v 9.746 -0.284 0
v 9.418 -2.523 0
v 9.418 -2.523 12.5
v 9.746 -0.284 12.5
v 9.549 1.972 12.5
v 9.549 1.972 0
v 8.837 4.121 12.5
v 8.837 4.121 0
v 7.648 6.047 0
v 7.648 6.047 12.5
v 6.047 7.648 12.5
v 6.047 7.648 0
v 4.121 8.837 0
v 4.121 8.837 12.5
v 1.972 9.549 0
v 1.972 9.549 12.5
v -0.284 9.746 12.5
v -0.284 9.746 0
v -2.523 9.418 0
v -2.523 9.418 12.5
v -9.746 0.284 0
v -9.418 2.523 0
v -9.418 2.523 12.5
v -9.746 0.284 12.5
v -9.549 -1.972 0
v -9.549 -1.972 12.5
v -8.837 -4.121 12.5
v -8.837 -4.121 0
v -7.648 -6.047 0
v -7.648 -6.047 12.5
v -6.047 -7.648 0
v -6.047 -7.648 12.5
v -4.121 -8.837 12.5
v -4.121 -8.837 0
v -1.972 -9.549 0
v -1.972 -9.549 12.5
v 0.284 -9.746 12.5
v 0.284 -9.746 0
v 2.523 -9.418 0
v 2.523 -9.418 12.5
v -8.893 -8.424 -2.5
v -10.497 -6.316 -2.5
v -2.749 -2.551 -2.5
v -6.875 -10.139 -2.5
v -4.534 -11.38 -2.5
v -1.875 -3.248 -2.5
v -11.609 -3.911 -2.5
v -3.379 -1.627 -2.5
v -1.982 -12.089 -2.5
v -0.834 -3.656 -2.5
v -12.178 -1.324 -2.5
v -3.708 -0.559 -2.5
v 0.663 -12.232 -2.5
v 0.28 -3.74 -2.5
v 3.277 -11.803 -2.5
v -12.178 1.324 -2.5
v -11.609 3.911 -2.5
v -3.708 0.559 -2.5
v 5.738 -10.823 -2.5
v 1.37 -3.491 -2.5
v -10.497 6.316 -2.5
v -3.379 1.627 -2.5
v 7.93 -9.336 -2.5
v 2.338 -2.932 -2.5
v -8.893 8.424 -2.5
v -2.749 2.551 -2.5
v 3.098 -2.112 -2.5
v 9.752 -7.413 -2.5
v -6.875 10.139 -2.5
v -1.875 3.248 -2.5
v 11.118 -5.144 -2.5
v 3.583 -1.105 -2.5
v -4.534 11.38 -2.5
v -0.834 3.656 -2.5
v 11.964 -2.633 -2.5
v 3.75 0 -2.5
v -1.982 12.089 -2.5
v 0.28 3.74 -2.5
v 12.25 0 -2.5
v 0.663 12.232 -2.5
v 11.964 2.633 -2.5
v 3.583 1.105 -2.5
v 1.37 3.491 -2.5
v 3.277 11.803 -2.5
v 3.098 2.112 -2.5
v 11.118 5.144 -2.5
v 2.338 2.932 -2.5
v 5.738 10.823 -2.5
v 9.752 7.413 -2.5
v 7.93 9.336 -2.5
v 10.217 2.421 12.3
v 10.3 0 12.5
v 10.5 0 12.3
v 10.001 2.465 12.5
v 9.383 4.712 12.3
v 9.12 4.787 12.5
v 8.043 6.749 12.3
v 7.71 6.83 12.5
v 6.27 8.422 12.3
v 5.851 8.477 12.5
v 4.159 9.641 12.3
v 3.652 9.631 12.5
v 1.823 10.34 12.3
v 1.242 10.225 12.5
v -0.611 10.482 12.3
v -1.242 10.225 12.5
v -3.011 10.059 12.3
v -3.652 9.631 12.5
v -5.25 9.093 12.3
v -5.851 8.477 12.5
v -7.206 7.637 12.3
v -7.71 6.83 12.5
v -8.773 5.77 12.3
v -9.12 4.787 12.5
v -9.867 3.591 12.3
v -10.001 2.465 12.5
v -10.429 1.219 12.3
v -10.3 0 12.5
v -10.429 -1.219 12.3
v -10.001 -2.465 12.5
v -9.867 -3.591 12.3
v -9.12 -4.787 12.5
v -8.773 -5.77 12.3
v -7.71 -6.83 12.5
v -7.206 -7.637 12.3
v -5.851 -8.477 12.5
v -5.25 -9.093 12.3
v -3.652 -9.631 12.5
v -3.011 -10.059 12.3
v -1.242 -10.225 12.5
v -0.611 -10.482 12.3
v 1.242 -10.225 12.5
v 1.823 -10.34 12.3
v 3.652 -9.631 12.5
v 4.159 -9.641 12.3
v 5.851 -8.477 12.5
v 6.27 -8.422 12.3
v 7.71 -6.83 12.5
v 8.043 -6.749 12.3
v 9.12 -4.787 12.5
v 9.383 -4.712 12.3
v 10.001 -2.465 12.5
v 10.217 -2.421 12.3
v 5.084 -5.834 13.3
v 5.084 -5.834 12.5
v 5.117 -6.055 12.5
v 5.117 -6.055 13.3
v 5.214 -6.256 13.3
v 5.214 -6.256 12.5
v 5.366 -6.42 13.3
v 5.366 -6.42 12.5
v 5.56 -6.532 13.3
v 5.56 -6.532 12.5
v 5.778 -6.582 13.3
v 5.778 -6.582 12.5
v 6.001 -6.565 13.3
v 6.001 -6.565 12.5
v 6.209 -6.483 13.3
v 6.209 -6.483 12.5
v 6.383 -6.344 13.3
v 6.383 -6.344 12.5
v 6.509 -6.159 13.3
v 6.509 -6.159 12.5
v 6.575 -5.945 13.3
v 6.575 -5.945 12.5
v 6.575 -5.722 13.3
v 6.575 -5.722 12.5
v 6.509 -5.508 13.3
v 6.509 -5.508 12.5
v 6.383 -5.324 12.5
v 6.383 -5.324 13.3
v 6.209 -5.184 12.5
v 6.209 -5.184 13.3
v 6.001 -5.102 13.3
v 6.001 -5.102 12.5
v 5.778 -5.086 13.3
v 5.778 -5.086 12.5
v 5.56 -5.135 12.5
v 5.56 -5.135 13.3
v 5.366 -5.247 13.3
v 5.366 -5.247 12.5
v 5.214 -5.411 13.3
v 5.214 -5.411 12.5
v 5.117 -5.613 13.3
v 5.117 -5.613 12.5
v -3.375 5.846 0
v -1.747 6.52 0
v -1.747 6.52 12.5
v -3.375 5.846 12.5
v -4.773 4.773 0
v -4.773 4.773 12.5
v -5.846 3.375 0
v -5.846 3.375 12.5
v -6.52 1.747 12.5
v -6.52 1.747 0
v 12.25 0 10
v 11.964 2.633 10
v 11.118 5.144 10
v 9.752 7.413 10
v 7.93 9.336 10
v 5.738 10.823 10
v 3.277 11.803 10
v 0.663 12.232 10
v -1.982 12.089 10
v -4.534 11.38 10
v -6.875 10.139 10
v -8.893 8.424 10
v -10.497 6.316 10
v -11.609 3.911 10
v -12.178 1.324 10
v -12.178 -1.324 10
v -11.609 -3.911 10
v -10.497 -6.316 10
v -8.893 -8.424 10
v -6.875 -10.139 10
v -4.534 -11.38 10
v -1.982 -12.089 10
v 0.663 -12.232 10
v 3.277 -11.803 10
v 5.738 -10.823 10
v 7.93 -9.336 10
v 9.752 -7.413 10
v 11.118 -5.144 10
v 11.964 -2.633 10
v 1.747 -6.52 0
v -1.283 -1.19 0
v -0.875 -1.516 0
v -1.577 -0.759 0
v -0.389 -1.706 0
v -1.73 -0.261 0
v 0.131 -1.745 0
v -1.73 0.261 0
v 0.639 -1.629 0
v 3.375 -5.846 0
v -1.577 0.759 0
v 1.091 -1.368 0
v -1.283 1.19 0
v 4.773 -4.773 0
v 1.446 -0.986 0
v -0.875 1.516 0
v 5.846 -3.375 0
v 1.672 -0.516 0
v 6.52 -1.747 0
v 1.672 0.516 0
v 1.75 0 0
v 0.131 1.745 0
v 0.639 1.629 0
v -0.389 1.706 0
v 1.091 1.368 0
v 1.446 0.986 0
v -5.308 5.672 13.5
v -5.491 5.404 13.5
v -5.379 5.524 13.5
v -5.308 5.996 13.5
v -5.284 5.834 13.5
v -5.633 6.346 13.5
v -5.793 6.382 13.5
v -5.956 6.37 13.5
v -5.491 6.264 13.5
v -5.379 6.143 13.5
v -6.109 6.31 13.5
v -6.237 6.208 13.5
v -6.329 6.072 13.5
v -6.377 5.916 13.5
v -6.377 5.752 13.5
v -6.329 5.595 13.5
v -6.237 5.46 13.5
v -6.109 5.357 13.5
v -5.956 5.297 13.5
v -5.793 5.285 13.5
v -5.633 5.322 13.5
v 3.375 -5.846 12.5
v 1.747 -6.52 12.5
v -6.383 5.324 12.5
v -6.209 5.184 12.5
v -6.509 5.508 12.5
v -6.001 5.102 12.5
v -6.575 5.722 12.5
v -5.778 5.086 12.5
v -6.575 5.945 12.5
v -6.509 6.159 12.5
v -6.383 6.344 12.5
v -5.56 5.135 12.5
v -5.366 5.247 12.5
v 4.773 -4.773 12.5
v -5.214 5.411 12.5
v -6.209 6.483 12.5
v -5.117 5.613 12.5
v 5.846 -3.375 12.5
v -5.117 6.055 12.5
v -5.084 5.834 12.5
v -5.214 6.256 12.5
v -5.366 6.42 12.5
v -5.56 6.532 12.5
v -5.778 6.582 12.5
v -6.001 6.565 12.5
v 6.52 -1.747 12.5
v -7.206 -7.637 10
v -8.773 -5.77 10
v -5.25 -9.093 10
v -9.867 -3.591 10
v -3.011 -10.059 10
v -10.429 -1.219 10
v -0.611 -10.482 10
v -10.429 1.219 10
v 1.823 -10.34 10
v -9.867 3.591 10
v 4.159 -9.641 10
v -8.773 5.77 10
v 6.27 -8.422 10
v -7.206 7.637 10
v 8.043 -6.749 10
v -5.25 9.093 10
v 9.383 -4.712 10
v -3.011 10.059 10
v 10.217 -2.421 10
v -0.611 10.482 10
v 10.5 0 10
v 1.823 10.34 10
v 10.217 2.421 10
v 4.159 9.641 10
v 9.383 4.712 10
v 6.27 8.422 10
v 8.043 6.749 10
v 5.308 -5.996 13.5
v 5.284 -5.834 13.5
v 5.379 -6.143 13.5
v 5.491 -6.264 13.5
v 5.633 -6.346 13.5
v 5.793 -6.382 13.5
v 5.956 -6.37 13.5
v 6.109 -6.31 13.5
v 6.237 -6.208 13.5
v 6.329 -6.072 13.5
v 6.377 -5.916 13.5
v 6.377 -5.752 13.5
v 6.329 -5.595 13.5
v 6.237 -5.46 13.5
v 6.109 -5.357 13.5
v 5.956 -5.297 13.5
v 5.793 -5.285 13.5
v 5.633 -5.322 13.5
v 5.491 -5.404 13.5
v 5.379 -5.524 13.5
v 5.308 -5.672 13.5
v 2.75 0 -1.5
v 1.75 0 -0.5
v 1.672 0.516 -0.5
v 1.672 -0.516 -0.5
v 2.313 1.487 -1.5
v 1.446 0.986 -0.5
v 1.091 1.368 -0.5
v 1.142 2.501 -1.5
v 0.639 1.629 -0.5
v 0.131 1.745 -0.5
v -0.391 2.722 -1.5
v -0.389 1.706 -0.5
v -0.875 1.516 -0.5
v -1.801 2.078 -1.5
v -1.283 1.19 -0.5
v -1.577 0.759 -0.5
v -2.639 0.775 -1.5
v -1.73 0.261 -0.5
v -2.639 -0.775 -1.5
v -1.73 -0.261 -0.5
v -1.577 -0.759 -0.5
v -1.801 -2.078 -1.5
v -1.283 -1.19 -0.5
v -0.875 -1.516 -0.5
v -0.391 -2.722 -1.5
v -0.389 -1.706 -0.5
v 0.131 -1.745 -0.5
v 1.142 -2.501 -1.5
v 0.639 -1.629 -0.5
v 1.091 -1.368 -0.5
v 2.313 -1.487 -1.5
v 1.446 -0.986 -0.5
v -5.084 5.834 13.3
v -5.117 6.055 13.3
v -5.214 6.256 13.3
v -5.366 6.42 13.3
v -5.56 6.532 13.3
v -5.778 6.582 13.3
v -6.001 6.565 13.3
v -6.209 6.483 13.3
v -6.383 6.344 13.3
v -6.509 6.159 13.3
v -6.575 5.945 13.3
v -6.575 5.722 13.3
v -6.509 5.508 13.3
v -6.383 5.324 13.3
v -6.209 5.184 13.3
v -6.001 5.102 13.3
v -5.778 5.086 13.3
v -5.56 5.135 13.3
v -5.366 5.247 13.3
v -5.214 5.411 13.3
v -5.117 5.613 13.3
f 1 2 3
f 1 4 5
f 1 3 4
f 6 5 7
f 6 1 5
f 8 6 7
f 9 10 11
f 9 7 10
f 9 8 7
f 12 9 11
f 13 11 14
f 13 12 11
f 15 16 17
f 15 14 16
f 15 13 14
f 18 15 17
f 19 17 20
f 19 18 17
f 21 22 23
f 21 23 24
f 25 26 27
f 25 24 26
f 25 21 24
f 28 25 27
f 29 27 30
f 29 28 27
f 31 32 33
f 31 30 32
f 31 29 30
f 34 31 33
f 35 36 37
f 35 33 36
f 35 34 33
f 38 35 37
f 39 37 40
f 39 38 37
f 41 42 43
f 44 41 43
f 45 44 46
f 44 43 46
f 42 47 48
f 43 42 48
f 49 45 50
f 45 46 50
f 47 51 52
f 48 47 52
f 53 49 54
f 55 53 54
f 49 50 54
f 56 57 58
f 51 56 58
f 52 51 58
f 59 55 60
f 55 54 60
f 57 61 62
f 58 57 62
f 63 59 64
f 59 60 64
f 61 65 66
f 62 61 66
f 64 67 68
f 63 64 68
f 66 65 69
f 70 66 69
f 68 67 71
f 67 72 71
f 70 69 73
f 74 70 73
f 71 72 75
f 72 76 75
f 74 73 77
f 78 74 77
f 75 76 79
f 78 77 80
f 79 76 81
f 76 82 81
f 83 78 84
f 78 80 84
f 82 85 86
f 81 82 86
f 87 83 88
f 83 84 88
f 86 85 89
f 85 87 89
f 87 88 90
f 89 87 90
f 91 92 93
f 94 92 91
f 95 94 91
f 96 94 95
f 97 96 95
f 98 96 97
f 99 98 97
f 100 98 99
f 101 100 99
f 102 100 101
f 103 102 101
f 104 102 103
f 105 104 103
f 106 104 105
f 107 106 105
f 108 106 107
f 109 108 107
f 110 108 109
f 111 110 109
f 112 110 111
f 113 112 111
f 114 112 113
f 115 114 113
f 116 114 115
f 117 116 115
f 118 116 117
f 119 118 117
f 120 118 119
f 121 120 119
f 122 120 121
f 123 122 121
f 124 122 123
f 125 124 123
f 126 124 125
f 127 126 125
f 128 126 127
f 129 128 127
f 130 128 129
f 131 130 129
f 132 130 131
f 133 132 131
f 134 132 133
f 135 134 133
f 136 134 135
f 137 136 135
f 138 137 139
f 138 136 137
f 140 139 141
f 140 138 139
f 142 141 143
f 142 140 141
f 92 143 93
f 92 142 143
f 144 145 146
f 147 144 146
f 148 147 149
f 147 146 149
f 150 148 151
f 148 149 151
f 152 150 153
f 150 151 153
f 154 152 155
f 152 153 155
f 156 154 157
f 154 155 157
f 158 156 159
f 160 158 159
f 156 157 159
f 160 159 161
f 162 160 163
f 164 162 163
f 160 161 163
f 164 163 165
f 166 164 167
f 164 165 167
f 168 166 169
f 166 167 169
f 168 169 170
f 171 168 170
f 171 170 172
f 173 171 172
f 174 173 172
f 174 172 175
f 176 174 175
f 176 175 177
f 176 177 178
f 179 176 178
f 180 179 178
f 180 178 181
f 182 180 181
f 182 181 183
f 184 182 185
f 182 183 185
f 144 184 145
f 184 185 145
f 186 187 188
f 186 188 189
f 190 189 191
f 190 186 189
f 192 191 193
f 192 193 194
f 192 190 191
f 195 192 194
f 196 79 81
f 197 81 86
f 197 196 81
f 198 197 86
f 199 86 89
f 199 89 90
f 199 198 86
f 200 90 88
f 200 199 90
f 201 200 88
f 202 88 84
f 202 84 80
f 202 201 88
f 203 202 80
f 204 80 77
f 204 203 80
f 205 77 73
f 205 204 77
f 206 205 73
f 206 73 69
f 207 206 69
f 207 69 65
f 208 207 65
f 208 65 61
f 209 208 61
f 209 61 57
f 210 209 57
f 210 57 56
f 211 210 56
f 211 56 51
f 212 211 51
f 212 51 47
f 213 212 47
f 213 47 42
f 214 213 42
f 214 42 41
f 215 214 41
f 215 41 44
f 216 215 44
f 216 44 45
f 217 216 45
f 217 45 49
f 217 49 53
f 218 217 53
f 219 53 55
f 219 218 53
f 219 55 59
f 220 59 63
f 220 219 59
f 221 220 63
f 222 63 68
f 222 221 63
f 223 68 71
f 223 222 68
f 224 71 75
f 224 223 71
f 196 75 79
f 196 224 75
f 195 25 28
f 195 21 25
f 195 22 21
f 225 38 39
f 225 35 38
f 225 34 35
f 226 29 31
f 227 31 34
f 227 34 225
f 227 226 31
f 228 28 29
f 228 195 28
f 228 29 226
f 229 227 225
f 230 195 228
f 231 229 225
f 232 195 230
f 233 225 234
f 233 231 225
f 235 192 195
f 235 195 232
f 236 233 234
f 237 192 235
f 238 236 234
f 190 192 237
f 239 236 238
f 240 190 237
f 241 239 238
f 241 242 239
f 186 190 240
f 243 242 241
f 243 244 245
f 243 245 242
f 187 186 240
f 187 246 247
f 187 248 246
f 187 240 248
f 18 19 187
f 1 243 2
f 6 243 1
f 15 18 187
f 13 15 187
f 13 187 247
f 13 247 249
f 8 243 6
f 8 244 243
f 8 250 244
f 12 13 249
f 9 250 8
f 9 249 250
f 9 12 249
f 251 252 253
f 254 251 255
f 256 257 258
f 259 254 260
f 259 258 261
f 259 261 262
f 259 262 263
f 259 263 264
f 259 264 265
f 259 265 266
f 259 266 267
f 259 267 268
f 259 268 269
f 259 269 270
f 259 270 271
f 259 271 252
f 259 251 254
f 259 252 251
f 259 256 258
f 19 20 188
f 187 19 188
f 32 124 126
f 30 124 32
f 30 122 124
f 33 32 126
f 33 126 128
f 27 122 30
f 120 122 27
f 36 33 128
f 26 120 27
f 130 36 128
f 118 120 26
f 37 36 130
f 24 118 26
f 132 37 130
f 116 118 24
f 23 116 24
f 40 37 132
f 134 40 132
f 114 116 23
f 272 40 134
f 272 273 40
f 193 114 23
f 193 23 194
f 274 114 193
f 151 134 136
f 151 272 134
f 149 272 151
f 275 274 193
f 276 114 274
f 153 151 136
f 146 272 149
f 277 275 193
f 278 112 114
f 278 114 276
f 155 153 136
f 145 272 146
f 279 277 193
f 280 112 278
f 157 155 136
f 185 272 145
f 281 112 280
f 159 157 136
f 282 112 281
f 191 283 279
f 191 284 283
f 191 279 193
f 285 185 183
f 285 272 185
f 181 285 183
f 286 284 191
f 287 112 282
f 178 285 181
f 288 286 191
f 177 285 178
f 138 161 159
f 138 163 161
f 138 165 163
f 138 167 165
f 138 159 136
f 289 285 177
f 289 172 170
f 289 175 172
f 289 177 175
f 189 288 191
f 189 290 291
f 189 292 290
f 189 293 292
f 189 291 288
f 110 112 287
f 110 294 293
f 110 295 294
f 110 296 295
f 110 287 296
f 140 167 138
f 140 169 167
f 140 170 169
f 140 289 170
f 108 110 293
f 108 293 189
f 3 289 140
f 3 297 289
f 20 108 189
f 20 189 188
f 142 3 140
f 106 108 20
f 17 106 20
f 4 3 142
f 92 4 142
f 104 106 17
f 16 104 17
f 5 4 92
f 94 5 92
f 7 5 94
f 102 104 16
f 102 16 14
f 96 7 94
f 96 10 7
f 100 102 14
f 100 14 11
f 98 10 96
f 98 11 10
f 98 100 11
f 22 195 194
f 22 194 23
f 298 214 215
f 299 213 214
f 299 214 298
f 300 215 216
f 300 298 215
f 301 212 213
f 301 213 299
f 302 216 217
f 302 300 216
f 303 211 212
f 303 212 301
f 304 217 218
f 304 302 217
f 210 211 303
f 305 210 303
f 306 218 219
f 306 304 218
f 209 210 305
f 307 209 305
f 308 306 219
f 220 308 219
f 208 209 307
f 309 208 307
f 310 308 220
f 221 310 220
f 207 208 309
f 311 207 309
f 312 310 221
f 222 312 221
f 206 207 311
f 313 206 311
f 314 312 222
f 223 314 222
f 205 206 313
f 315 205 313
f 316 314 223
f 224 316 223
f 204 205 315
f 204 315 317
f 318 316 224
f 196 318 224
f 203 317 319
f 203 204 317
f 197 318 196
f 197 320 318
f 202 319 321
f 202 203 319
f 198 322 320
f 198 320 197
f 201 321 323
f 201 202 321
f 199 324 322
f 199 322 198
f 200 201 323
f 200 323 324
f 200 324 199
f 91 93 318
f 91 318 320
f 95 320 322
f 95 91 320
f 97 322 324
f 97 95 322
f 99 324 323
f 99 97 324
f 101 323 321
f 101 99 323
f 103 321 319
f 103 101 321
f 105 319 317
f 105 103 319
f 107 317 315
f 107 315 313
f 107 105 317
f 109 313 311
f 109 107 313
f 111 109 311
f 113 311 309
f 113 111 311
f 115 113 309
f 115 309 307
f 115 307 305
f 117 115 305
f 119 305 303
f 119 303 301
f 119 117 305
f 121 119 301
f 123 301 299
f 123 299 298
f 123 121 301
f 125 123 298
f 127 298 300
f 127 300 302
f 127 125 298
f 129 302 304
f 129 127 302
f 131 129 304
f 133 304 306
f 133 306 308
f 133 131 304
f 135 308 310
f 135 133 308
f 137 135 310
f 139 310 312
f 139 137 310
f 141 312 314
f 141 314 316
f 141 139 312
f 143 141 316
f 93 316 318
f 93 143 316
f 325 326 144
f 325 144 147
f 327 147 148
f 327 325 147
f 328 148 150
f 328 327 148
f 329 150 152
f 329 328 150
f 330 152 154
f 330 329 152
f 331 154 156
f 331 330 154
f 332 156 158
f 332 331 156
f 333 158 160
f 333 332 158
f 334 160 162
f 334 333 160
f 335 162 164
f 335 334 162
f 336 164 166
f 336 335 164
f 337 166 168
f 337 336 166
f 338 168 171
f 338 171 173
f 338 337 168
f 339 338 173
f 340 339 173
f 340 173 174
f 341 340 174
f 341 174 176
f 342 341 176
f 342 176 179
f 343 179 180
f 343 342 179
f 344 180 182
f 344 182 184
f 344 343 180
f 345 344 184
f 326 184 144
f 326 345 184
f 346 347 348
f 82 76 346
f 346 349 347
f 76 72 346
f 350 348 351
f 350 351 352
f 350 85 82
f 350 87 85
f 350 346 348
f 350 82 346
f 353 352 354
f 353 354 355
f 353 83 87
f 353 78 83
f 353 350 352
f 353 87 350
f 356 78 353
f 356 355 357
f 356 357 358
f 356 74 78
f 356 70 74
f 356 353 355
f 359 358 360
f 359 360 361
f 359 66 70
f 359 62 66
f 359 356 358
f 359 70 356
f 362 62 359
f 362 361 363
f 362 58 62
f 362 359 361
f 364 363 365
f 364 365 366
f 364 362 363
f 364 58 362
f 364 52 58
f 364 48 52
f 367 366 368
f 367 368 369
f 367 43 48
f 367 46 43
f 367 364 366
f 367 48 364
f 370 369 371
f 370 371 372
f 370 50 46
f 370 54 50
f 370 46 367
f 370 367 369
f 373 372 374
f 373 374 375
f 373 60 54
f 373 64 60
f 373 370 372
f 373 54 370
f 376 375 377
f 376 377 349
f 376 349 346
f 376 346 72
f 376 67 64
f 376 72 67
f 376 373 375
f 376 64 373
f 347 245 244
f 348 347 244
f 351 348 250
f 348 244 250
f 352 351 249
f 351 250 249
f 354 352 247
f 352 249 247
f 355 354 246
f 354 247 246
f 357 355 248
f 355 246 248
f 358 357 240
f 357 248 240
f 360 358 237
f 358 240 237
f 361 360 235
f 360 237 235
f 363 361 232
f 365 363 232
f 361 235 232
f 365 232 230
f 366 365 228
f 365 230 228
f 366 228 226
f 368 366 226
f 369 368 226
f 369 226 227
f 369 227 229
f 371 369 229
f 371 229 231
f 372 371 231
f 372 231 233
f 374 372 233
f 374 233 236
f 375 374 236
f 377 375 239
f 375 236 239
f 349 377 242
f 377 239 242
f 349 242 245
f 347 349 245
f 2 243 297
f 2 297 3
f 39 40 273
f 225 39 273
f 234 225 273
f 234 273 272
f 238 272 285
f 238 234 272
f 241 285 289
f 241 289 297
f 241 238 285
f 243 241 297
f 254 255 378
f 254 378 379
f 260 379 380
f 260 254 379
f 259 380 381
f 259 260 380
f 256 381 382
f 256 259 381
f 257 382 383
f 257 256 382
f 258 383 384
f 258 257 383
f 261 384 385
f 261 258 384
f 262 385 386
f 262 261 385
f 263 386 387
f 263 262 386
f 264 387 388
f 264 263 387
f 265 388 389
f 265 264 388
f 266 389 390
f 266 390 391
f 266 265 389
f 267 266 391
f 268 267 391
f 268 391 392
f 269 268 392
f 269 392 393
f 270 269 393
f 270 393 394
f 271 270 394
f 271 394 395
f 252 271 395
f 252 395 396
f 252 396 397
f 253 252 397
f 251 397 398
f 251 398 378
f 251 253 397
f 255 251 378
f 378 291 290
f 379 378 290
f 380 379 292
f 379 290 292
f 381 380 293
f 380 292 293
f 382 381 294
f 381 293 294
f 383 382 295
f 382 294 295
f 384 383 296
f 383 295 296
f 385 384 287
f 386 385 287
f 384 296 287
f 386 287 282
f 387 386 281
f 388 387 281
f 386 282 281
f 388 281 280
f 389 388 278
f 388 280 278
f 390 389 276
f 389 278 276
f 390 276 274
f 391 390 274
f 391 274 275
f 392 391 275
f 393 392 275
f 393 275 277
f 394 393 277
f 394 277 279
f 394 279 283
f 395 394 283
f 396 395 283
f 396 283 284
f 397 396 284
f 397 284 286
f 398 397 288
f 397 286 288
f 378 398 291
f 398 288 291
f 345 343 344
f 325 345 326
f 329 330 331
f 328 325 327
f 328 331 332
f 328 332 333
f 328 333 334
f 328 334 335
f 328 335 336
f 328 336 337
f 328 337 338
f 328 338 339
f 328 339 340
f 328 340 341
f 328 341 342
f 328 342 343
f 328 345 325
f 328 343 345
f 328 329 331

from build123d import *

# Parameters (mm, degrees)
SKETCH005_R           = 12.25
SKETCH005_R_2         = 1.75
PAD004_DEPTH          = 2.5
CHAMFER001_SIZE       = 2
PAD005_DEPTH          = 12.5
POLARPATTERN001_COUNT = 2
SKETCH008_R           = 0.75
PAD006_DEPTH          = 1
POLARPATTERN002_COUNT = 2
CHAMFER002_SIZE       = 0.2


with BuildPart() as part:
    # Sketch005 → Pad004 (new body)
    with BuildSketch(Plane.XY):
        Circle(SKETCH005_R)
        Circle(SKETCH005_R_2, mode=Mode.SUBTRACT)
    extrude(amount=-PAD004_DEPTH)

    # Chamfer001
    chamfer001_edges = [part.edges().sort_by_distance(p)[0] for p in [
        (-1.75, 0, -2.5),
    ]]
    chamfer(chamfer001_edges, length=CHAMFER001_SIZE)

    # Sketch006 → Revolution (revolve)
    with BuildSketch(Plane.XZ):
        Polygon((12.25, 0), (12.25, 10), (10.5, 10), (10.5, 12.5), (9.75, 12.5), (9.75, 0), align=None)
    revolve(axis=Axis((0, 0, 0), (0, 0, 1)))

    # Sketch007 → Pad005 (join)
    with BuildSketch(Plane.XY):
        with BuildLine():
            ThreePointArc((-2.523486, 9.417777), (-6.894291, 6.894291), (-9.417777, 2.523486))
            Line((-6.519999, 1.747029), (-9.417777, 2.523486))
            ThreePointArc((-1.747029, 6.519999), (-4.772971, 4.772971), (-6.519999, 1.747029))
            Line((-2.523486, 9.417777), (-1.747029, 6.519999))
        make_face()
    pad005 = extrude(amount=PAD005_DEPTH)

    # PolarPattern001: Pad005 ×2 about axis
    polarpattern001_axis = Axis((0, 0, 0), (0, 0, 1))
    for i in range(1, POLARPATTERN001_COUNT):
        add(pad005.rotate(polarpattern001_axis, i * 360 / POLARPATTERN001_COUNT))

    # Sketch008 (on DatumPlane) → Pad006 (join)
    with BuildSketch(Plane.XY.offset(12.5)):
        with Locations((-5.833631, 5.833631)):
            Circle(SKETCH008_R)
    pad006 = extrude(amount=PAD006_DEPTH)

    # PolarPattern002: Pad006 ×2 about axis
    polarpattern002_axis = Axis((0, 0, 12.5), (0, 0, 1))
    for i in range(1, POLARPATTERN002_COUNT):
        add(pad006.rotate(polarpattern002_axis, i * 360 / POLARPATTERN002_COUNT))

    # Chamfer002
    chamfer002_edges = [part.edges().sort_by_distance(p)[0] for p in [
        (-6.583631, 5.833631, 13.5),
        (6.583631, -5.833631, 13.5),
        (-10.5, 0, 12.5),
    ]]
    chamfer(chamfer002_edges, length=CHAMFER002_SIZE)


solid = part.part
